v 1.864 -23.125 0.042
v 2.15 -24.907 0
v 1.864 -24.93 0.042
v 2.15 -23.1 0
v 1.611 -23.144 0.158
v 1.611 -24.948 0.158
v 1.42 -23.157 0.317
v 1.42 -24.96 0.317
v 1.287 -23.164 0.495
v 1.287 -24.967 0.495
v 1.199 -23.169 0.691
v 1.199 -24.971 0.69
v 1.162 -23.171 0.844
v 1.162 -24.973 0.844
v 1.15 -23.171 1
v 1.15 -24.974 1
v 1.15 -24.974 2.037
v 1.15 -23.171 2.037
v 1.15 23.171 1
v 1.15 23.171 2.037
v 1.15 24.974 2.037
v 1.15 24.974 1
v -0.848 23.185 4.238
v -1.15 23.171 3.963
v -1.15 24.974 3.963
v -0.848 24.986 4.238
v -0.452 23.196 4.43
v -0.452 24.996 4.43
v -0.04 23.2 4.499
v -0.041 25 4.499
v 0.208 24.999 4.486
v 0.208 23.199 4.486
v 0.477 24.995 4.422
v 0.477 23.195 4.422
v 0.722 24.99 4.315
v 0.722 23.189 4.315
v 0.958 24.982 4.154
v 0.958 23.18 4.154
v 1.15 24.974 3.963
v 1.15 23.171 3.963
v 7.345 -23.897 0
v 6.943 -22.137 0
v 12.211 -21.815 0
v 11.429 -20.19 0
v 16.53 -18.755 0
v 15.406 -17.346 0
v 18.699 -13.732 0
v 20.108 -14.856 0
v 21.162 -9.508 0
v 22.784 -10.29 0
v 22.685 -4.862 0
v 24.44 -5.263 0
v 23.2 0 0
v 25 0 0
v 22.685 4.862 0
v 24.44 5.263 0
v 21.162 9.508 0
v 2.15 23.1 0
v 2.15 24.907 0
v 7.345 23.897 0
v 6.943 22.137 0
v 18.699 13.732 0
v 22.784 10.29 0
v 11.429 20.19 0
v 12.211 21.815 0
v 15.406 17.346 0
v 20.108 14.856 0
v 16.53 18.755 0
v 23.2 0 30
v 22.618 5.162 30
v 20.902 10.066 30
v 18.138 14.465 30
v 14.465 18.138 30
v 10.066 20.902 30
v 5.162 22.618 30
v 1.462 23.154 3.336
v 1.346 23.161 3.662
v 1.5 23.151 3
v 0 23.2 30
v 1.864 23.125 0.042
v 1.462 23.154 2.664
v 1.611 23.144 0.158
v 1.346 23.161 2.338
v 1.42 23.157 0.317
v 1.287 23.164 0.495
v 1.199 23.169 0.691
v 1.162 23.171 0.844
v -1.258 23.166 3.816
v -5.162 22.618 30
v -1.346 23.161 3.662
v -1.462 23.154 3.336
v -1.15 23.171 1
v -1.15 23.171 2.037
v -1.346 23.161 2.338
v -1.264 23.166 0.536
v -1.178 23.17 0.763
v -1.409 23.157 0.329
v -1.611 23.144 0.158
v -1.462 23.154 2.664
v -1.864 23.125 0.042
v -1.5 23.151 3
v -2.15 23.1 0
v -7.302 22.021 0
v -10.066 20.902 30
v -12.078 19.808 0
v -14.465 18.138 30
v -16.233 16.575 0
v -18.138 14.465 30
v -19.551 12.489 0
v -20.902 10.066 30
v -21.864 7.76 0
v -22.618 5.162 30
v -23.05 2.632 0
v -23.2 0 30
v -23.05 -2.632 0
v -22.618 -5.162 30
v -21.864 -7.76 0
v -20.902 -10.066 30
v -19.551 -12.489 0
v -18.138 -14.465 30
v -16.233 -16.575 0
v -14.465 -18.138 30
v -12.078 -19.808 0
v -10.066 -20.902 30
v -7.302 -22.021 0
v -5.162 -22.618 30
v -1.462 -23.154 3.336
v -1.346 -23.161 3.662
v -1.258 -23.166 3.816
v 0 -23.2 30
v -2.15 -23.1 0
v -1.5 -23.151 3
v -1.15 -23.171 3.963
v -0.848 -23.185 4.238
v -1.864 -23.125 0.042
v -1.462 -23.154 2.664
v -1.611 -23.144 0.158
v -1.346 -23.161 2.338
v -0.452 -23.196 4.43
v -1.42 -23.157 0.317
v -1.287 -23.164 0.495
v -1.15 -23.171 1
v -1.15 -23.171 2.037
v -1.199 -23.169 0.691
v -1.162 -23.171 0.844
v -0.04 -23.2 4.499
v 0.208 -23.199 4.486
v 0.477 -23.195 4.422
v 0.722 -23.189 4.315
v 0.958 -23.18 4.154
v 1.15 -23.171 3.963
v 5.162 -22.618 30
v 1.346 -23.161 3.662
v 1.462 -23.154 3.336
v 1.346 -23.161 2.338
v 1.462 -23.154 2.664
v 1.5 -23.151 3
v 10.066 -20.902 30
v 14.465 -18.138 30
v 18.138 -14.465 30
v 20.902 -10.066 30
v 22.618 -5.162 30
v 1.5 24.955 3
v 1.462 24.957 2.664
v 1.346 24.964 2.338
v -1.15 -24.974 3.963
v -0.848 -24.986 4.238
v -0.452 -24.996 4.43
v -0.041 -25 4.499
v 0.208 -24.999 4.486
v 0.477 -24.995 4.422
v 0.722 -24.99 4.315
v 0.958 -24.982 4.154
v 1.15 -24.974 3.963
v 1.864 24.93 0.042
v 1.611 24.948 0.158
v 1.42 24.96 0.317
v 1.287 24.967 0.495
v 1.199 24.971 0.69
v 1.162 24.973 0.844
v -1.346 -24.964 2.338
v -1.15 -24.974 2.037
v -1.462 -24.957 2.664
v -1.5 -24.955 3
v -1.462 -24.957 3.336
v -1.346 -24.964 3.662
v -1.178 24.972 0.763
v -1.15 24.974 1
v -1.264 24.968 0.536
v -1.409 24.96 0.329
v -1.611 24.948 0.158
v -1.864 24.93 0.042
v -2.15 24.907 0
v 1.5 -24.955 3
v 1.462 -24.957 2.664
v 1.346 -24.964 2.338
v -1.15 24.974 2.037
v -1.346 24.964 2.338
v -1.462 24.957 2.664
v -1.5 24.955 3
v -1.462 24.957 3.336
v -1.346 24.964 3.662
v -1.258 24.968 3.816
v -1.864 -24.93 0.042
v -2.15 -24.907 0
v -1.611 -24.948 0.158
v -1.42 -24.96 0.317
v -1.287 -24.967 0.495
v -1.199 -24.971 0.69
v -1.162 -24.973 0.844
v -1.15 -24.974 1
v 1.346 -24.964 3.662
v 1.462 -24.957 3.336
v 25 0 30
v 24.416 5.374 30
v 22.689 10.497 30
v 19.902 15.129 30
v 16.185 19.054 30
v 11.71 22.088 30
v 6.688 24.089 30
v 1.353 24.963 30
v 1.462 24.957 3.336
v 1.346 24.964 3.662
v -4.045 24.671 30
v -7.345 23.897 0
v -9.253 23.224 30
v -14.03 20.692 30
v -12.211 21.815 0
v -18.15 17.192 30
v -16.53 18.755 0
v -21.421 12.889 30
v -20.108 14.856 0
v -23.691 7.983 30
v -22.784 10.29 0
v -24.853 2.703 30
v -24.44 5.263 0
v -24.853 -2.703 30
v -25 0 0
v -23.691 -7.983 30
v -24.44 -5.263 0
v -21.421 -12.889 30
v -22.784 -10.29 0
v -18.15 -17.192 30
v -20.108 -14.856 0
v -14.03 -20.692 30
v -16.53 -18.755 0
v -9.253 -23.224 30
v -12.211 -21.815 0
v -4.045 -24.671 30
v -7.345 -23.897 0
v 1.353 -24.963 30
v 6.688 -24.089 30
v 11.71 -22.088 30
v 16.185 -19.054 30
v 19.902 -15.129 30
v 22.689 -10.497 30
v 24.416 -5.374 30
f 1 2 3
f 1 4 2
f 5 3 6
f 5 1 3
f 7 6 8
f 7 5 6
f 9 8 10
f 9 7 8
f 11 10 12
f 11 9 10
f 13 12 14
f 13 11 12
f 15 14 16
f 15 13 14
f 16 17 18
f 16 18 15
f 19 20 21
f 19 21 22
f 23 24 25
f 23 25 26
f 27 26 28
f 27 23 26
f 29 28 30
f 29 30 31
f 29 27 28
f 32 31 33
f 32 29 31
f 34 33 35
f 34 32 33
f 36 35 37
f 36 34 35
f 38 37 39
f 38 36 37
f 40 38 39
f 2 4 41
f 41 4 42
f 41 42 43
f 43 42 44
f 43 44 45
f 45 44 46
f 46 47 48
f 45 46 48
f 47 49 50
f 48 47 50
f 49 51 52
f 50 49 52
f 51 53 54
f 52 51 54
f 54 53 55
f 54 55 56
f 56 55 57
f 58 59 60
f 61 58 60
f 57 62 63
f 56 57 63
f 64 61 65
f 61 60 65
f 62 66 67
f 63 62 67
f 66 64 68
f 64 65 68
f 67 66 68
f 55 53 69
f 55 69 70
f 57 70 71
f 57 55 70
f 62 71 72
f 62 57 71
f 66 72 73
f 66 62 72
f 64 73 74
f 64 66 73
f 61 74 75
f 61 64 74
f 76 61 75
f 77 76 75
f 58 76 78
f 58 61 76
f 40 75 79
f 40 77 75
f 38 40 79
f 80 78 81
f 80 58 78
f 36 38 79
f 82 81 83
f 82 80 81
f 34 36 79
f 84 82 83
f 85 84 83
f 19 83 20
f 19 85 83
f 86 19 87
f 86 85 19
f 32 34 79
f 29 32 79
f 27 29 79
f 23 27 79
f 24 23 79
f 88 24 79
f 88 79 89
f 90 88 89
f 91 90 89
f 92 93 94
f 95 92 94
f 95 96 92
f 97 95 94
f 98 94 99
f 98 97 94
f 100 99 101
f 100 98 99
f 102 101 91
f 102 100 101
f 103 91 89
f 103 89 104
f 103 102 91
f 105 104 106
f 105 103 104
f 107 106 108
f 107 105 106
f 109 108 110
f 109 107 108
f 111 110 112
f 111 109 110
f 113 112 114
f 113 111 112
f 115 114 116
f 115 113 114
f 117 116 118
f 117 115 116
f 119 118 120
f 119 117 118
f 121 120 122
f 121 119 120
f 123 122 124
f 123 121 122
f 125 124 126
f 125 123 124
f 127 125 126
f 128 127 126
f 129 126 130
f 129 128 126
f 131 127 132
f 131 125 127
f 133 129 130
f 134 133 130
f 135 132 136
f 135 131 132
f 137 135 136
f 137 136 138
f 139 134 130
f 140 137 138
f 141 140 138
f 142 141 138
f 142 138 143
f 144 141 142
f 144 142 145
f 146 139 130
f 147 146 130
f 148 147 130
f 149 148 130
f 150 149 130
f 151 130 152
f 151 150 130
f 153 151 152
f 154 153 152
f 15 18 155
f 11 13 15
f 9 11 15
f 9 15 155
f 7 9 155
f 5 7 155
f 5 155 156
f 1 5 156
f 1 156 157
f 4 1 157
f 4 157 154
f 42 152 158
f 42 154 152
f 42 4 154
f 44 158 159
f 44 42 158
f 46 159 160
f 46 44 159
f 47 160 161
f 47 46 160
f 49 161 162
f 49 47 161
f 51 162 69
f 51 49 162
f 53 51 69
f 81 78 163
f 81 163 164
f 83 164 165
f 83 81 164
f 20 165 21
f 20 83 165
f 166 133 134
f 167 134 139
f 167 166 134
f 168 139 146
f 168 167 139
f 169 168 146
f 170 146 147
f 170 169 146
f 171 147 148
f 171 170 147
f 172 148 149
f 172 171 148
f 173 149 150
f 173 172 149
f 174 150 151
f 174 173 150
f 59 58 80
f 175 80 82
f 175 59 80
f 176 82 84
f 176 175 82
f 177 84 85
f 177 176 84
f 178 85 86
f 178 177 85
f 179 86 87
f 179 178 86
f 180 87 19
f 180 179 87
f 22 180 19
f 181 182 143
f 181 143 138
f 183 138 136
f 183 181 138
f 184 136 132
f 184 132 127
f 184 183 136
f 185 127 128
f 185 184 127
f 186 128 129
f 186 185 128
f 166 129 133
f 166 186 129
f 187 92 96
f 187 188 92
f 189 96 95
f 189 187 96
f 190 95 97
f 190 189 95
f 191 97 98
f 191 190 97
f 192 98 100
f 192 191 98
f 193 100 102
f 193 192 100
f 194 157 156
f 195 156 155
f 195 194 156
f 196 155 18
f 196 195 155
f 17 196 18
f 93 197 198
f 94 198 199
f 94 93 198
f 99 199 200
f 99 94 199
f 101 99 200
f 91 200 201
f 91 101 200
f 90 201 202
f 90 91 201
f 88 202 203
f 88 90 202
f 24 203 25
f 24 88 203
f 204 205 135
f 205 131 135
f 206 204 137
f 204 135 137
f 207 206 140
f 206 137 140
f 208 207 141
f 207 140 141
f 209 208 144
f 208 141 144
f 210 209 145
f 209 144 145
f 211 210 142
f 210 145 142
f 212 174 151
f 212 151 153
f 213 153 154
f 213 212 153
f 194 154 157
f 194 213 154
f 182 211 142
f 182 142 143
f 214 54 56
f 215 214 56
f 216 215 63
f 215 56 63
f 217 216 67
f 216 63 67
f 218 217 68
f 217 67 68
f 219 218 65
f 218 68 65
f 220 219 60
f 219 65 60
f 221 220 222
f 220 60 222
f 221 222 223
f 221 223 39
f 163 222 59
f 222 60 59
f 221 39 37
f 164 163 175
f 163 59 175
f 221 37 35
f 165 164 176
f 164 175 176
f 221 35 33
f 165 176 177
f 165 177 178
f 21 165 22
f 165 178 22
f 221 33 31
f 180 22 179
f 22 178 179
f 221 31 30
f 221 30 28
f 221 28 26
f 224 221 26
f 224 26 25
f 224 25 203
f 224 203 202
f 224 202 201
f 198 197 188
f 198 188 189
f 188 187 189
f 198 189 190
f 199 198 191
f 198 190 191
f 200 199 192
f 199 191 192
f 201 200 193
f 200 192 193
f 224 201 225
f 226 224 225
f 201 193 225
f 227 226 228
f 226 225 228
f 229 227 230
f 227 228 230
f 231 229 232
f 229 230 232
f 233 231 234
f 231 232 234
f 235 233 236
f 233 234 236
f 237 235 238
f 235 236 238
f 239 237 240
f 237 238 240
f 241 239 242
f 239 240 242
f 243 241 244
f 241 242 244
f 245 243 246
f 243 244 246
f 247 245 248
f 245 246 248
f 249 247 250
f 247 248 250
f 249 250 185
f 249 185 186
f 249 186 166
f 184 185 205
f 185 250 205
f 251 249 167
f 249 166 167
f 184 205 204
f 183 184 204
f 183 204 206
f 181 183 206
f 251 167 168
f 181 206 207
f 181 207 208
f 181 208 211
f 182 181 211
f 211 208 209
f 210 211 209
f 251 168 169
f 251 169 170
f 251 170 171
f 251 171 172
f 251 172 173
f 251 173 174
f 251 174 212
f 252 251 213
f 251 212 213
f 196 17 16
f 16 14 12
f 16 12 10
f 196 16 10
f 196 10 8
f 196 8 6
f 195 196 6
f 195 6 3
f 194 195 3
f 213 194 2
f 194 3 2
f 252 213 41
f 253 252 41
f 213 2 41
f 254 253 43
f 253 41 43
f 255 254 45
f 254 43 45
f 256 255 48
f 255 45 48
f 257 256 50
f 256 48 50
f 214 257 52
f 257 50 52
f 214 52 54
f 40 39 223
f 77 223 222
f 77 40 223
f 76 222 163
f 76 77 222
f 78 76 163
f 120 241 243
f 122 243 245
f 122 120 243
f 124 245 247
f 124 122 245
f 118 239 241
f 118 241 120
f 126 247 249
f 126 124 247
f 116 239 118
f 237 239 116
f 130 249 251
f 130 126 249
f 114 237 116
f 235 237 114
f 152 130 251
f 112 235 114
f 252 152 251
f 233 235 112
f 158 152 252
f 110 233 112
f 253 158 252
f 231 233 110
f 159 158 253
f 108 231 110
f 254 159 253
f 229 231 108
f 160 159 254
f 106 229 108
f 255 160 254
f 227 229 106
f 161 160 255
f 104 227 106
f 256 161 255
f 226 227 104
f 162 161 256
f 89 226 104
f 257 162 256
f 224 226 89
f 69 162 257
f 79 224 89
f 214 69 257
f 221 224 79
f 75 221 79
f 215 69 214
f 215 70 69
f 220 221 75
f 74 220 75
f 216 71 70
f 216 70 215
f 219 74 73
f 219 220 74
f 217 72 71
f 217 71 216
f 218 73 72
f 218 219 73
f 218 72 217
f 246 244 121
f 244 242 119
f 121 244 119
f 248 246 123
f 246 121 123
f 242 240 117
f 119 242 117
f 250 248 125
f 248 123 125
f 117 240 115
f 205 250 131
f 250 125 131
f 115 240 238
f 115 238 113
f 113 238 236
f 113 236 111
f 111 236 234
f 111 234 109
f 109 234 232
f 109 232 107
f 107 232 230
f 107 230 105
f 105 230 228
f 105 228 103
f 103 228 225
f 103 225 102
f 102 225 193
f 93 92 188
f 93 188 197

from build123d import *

# Parameters (mm, degrees)
SKETCH_1_R               = 25
SKETCH_1_R_2             = 23.2
EXTRUDE_1_DEPTH          = 30
CUT_EXTRUDE_1_DEPTH      = 47.368092477
CUT_EXTRUDE_1_DEPTH_BACK = 47.368092477
FILLET_1_R               = 1


with BuildPart() as part:
    # 草图1 → 凸台-拉伸1 (new body)
    with BuildSketch(Plane.XY):
        Circle(SKETCH_1_R)
        Circle(SKETCH_1_R_2, mode=Mode.SUBTRACT)
    extrude(amount=EXTRUDE_1_DEPTH)

    # 草图3 → 切除-拉伸1 (cut, two sides: drawn at the far end of the back side and taken through both)
    with BuildSketch(Plane(origin=(0, 0, 0), x_dir=(1, 0, 0), z_dir=(0, 1, 0)).offset(-CUT_EXTRUDE_1_DEPTH_BACK)):
        with BuildLine():
            Line((-1.15, 0), (-1.15, -2.036931986))
            ThreePointArc((-1.15, -2.036931986), (0, -1.5), (1.15, -2.036931986))
            Line((1.15, -2.036931986), (1.15, 0))
            Line((1.15, 0), (-1.15, 0))
        make_face()
        with BuildLine():
            Line((-1.15, -2.036931986), (-1.15, -3.963068014))
            ThreePointArc((-1.15, -3.963068014), (0, -4.5), (1.15, -3.963068014))
            Line((1.15, -3.963068014), (1.15, -2.036931986))
            ThreePointArc((1.15, -2.036931986), (0, -1.5), (-1.15, -2.036931986))
        make_face()
        with BuildLine():
            Line((1.15, -2.036931986), (1.15, -3.963068014))
            ThreePointArc((1.15, -3.963068014), (1.409787218, -3.512347538), (1.5, -3))
            ThreePointArc((1.5, -3), (1.409787218, -2.487652462), (1.15, -2.036931986))
        make_face()
        with BuildLine():
            ThreePointArc((-1.15, -2.036931986), (-1.5, -3), (-1.15, -3.963068014))
            Line((-1.15, -3.963068014), (-1.15, -2.036931986))
        make_face()
    extrude(amount=CUT_EXTRUDE_1_DEPTH + CUT_EXTRUDE_1_DEPTH_BACK, mode=Mode.SUBTRACT)

    # 圆角1
    fillet_1_edges = [part.edges().sort_by_distance(p)[0] for p in [
        (-1.15, 24.072508154, 0),
        (-1.15, -24.072508154, 0),
        (1.15, -24.072508154, 0),
        (1.15, 24.072508154, 0),
    ]]
    fillet(fillet_1_edges, radius=FILLET_1_R)


solid = part.part
